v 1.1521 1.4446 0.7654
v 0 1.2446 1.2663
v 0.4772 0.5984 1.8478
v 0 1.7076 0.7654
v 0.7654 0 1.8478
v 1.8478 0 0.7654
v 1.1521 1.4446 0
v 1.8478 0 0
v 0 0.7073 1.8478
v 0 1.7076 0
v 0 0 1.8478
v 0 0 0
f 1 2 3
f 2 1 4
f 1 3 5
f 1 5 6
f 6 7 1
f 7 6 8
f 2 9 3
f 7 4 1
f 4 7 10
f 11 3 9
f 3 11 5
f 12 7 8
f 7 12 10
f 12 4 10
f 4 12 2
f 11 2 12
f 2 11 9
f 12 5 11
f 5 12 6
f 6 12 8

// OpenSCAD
// Generated by generate_scads.py
intersection() {
  intersection() {
    cylinder(h=15, r=2, center=true);
    sphere(r=2);
    cube(size=[10,30,30], center=false);
    cylinder(h=10, r=12, center=false);
  }
}
